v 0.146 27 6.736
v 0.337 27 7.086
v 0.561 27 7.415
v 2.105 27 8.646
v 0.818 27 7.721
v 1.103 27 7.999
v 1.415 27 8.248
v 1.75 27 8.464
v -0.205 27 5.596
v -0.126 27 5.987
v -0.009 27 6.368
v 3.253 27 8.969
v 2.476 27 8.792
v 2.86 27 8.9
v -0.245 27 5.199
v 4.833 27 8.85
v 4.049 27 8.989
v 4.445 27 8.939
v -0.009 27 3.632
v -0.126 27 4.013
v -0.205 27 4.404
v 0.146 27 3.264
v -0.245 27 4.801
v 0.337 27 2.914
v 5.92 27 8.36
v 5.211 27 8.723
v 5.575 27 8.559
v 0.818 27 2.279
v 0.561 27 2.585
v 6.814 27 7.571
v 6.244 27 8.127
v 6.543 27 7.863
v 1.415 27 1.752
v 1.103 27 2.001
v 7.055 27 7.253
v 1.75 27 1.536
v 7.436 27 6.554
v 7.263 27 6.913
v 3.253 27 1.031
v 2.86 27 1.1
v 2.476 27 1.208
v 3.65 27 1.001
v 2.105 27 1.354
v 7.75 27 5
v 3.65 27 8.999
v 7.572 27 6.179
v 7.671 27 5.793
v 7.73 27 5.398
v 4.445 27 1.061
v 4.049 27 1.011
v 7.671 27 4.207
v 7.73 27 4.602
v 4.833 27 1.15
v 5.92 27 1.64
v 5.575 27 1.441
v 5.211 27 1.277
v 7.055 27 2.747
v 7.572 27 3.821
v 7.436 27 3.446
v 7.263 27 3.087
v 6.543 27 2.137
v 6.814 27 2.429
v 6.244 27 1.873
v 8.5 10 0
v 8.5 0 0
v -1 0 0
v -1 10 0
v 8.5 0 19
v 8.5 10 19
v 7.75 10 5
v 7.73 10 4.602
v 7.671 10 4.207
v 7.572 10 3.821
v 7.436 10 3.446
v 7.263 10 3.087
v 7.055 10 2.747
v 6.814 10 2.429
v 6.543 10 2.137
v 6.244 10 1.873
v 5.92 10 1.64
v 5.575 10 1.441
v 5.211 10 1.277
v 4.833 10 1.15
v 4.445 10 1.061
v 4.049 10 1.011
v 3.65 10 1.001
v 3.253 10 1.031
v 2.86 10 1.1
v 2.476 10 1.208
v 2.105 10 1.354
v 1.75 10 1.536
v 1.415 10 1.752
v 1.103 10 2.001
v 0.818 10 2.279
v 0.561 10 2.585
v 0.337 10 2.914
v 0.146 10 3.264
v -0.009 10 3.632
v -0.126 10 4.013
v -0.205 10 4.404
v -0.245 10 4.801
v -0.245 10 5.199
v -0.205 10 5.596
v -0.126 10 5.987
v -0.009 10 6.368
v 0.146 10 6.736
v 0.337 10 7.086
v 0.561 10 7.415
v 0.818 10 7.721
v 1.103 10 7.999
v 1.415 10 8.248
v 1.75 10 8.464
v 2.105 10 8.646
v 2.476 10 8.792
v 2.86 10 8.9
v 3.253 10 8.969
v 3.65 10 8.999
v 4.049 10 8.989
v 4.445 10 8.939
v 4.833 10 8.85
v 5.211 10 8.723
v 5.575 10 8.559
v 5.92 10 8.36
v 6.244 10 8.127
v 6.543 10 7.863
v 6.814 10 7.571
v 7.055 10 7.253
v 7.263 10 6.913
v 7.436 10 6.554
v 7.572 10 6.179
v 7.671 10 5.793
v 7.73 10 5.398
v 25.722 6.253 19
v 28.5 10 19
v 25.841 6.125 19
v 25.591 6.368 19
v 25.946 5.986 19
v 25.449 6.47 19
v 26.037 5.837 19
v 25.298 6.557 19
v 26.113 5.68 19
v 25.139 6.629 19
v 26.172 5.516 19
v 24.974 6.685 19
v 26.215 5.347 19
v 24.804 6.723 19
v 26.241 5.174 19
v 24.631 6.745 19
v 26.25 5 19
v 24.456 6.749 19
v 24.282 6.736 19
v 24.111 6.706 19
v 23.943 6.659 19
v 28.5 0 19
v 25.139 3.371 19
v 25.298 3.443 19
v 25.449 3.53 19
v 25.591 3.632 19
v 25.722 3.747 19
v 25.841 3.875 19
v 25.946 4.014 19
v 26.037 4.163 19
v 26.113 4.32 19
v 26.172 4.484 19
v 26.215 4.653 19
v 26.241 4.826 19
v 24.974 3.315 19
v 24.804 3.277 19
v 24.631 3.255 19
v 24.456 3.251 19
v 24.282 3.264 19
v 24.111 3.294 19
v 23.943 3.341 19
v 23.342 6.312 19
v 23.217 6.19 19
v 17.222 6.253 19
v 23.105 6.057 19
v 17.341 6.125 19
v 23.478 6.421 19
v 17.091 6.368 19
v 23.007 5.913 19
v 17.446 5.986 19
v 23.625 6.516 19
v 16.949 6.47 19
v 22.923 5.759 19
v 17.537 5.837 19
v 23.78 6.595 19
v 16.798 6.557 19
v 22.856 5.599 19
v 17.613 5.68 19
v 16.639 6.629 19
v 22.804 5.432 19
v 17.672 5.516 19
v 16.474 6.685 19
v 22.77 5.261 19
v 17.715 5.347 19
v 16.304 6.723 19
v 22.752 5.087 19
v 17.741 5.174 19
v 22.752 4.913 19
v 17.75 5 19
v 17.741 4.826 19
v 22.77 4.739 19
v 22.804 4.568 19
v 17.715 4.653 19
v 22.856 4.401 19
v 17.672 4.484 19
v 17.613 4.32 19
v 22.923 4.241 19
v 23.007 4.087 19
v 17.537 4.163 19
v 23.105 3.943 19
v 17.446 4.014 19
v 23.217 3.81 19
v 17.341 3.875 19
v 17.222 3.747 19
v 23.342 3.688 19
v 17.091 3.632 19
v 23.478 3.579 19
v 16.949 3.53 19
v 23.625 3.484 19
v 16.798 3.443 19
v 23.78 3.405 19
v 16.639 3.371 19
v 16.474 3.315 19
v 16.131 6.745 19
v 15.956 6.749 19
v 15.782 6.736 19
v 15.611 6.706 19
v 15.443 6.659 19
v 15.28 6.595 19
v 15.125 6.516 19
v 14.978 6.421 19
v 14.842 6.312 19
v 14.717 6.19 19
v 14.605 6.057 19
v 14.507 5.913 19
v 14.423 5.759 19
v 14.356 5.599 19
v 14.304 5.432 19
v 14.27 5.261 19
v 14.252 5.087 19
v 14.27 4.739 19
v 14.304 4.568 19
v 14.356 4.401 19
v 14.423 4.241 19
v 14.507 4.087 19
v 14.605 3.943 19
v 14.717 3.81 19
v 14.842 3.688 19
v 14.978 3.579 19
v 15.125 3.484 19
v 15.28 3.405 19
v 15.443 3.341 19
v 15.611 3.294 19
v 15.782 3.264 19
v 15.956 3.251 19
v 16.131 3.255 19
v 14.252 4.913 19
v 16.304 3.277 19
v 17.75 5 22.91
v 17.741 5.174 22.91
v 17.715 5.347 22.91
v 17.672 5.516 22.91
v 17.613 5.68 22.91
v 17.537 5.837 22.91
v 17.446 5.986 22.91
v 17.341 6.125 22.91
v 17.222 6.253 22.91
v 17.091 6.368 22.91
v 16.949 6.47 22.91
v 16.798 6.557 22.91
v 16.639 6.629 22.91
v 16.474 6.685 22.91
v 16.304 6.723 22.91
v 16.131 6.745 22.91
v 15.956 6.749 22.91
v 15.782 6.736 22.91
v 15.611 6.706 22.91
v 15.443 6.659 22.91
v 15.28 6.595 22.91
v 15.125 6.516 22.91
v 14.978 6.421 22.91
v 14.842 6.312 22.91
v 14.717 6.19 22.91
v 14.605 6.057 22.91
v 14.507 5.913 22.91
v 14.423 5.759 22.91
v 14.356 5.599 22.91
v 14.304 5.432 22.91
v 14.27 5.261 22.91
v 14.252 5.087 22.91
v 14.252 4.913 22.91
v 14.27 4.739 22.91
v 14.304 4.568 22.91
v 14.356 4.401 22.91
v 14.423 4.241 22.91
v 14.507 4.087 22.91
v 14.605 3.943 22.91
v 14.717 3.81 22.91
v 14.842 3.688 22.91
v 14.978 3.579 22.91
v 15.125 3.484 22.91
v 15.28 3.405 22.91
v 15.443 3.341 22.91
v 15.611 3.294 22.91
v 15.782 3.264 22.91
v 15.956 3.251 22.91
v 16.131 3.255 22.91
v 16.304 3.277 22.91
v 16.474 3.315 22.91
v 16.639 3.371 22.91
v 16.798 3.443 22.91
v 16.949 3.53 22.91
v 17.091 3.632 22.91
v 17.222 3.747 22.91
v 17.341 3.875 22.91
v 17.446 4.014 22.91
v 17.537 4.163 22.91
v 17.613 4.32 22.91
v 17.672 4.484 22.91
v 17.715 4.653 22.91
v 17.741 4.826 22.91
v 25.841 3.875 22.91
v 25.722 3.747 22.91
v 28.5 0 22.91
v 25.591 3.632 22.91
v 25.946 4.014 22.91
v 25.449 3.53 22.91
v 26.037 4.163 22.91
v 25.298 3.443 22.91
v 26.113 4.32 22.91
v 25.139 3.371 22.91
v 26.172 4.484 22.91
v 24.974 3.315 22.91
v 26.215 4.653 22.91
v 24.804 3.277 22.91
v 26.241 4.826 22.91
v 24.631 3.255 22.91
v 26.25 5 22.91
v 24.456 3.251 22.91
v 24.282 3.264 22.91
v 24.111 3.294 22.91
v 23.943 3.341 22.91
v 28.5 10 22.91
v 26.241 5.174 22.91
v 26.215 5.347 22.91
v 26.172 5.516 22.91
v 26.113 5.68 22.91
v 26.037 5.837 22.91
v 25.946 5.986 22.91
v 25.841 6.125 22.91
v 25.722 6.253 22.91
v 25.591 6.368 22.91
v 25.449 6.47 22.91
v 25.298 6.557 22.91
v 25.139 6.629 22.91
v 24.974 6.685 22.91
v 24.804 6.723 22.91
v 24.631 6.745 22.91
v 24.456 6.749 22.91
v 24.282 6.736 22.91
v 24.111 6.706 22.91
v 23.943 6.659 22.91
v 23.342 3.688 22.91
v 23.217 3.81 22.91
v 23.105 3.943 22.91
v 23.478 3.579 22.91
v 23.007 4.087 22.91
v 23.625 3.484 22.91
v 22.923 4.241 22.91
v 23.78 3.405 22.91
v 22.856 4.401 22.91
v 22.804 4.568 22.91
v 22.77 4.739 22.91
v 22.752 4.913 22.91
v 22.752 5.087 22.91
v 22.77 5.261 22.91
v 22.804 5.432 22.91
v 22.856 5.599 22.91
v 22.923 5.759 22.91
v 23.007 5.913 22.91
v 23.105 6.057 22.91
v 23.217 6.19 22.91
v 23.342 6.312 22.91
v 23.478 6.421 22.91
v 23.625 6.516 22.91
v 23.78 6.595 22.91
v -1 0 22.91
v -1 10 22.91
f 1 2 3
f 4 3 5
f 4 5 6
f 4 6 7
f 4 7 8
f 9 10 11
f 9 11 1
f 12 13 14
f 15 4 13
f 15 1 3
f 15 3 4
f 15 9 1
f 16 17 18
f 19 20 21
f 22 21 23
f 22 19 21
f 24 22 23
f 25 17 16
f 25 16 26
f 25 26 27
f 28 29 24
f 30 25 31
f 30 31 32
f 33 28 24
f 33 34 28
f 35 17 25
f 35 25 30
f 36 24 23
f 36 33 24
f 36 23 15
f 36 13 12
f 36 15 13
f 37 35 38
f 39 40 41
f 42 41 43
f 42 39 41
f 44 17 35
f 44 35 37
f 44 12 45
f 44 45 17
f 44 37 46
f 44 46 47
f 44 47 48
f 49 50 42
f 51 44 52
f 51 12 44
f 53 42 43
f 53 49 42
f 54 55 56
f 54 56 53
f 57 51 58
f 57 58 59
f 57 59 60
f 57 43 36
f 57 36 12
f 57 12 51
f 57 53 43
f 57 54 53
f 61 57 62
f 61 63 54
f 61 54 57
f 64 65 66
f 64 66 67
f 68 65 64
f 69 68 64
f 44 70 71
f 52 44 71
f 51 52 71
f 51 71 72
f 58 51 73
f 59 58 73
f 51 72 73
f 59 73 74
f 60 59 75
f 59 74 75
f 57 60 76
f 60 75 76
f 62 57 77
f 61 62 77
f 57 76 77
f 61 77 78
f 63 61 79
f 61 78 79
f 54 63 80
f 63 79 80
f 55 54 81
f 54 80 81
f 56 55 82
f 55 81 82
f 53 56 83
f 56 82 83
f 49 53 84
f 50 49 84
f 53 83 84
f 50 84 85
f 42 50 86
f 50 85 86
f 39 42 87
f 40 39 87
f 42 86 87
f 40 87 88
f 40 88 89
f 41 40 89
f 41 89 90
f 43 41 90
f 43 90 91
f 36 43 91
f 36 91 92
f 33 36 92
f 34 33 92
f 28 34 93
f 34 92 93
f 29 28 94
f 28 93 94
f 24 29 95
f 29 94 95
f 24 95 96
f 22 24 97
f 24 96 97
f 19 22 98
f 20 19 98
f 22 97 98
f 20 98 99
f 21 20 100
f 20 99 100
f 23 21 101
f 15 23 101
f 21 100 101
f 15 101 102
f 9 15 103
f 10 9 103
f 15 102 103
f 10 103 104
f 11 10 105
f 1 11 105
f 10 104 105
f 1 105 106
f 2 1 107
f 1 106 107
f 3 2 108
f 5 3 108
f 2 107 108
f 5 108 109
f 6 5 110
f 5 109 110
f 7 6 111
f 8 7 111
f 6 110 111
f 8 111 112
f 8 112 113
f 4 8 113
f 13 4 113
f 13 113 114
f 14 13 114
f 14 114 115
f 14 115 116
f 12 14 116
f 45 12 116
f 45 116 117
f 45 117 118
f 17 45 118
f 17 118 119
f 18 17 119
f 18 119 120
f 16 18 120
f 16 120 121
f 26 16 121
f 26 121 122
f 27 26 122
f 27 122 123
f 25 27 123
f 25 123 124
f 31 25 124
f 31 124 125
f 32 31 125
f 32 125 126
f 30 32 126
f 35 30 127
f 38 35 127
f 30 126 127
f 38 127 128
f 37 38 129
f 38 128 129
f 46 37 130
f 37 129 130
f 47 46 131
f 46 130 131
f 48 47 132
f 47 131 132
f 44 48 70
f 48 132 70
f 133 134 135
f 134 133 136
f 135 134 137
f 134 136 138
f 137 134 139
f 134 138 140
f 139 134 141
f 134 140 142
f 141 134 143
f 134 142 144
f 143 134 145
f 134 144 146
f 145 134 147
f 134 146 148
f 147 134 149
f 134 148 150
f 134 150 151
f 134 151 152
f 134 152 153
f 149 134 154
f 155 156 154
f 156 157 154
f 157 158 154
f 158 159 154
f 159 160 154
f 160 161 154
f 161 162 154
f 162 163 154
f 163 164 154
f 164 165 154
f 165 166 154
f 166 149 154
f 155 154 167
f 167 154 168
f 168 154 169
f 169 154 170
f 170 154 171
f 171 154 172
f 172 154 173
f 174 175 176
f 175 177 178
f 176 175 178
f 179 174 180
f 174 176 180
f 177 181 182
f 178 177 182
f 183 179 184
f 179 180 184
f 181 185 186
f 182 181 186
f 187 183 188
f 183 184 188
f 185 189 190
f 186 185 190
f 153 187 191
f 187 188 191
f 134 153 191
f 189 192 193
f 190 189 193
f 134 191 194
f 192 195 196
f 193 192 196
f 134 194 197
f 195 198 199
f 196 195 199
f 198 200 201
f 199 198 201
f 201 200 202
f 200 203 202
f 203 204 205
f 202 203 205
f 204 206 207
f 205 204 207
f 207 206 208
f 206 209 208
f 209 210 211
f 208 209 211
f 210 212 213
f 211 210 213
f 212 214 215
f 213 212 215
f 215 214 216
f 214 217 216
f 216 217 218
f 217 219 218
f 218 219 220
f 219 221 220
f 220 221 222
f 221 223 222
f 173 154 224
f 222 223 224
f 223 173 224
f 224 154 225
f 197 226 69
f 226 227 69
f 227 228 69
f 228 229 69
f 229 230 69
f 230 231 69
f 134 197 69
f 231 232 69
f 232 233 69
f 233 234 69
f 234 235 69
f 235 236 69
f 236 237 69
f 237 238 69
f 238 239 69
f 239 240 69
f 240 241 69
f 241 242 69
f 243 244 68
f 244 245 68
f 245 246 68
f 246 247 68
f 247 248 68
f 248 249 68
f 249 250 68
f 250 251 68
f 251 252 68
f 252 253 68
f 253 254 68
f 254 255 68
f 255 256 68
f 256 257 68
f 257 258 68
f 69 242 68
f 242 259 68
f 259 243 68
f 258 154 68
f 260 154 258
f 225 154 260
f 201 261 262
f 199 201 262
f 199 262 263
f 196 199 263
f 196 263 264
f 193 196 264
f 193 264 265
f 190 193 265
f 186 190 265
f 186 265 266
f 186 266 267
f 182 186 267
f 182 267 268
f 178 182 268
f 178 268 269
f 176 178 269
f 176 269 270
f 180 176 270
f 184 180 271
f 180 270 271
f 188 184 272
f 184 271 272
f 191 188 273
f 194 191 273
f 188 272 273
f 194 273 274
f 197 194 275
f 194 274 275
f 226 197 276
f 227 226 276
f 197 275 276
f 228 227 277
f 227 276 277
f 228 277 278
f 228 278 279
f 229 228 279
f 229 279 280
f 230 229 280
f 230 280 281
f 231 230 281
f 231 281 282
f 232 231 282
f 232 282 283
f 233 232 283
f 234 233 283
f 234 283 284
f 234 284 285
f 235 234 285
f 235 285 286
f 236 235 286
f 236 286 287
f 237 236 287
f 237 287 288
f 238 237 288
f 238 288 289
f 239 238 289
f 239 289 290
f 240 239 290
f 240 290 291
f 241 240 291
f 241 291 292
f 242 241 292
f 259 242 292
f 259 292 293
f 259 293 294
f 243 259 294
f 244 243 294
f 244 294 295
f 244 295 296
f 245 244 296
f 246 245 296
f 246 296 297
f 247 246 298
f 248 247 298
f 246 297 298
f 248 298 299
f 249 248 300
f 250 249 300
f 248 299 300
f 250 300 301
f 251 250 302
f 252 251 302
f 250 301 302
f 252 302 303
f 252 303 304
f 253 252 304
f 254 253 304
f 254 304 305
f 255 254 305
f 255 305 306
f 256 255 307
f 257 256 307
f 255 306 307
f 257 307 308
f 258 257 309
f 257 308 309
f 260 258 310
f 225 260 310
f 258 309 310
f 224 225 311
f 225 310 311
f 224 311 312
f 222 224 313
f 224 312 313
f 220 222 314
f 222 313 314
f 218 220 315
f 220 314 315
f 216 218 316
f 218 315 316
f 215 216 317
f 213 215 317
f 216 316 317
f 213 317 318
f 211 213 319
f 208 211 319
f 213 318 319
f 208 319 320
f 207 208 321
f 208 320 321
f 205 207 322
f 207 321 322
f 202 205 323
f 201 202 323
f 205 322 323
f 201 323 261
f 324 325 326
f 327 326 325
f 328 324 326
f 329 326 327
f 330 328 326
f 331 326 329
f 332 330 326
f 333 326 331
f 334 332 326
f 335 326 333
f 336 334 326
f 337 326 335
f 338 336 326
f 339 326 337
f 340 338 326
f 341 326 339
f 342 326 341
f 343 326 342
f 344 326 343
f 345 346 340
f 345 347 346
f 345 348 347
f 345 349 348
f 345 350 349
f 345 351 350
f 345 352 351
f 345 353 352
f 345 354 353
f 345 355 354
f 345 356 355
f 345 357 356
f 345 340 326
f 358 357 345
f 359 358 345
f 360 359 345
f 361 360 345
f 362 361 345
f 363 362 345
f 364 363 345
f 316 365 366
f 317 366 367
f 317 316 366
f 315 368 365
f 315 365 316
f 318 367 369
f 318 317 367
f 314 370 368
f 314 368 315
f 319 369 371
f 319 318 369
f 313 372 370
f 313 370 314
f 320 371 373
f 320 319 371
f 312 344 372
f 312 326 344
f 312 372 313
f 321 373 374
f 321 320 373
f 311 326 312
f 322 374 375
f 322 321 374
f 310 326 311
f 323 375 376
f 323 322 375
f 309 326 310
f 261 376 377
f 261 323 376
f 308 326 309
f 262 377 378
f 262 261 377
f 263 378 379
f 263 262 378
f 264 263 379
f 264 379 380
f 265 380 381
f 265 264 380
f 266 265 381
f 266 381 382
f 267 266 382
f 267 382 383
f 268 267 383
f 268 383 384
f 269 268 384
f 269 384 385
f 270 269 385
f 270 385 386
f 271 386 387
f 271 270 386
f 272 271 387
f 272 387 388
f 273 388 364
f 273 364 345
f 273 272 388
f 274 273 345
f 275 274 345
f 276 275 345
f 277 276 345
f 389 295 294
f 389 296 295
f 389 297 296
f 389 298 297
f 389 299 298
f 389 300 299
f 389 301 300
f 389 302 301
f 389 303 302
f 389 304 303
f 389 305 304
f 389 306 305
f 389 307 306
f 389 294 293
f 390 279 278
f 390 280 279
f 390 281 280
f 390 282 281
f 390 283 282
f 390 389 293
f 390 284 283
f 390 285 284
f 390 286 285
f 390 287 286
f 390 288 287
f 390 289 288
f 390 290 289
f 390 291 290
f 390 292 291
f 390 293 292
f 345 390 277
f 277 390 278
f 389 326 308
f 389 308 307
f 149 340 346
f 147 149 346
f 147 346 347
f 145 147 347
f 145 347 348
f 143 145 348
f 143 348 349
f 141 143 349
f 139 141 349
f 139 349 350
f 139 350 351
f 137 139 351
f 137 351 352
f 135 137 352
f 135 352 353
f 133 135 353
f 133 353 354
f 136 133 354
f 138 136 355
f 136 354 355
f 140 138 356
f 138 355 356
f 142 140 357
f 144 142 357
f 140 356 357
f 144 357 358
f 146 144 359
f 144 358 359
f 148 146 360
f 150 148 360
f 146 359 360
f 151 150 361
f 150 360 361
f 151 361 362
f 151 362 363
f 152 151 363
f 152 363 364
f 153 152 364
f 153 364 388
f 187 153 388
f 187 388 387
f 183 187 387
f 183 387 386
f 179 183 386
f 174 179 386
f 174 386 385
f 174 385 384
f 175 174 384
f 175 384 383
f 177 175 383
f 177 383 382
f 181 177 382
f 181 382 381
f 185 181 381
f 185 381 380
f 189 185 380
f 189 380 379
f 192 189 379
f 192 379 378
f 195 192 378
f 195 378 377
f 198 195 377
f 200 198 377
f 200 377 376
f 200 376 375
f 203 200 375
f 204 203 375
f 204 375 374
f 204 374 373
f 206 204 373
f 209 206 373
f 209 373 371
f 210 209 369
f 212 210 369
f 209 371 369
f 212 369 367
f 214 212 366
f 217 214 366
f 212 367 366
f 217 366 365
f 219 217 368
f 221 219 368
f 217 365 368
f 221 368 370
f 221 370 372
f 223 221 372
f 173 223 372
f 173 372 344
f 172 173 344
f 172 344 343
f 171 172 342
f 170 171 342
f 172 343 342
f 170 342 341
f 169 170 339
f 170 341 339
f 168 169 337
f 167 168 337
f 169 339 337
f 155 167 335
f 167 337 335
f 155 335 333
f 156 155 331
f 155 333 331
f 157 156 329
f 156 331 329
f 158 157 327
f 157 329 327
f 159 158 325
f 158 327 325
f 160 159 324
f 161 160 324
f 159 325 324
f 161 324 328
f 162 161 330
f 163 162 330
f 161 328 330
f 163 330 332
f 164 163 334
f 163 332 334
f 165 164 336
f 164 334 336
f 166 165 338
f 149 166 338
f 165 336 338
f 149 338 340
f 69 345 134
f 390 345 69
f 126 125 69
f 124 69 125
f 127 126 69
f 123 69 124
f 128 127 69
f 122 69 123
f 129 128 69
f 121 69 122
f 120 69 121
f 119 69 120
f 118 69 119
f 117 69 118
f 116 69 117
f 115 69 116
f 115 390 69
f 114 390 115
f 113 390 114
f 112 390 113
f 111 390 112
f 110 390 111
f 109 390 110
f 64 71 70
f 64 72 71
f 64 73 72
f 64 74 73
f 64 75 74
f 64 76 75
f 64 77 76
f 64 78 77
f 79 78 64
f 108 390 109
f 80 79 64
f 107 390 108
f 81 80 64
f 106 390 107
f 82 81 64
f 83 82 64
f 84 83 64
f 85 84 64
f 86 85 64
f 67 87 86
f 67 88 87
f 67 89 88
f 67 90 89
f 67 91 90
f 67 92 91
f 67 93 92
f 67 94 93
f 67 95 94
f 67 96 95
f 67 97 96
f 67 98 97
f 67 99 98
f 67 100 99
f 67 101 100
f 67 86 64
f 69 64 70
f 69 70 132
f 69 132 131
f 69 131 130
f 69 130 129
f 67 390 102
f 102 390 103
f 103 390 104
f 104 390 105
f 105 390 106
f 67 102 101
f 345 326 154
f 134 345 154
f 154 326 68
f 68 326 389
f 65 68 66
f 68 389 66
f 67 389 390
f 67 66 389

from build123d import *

# Parameters (mm, degrees)
SKETCH1_W           = 12.5
SKETCH1_H           = 10
BOSS_EXTRUDE1_DEPTH = 10
SKETCH2_W           = 10
SKETCH2_H           = 10
BOSS_EXTRUDE2_DEPTH = 5
SKETCH3_R           = 4
BOSS_EXTRUDE3_DEPTH = 17
SKETCH4_W           = 4
SKETCH4_H           = 10
CUT_EXTRUDE1_DEPTH  = 11
SKETCH5_W           = 9.5
SKETCH5_H           = 10
BOSS_EXTRUDE4_DEPTH = 12.5
SKETCH6_W           = 5
SKETCH6_H           = 10
BOSS_EXTRUDE5_DEPTH = 30
SKETCH7_R           = 1.75
CUT_EXTRUDE2_DEPTH  = 23.5
SKETCH8_W           = 30
SKETCH8_H           = 5
CUT_EXTRUDE4_DEPTH  = 10
SKETCH10_W          = 9.5
SKETCH10_H          = 10
CUT_EXTRUDE6_DEPTH  = 3.49
SKETCH11_W          = 9.5
SKETCH11_H          = 10
BOSS_EXTRUDE6_DEPTH = 3.9
SKETCH12_W          = 4
SKETCH12_H          = 10
BOSS_EXTRUDE7_DEPTH = 20
SKETCH13_W          = 20
SKETCH13_H          = 0.09
CUT_EXTRUDE7_DEPTH  = 28
SKETCH14_R          = 1.75
CUT_EXTRUDE8_DEPTH  = 23.91


with BuildPart() as part:
    # Sketch1 → Boss-Extrude1 (new body)
    with BuildSketch(Plane.XY):
        with Locations((6.25, 5)):
            Rectangle(SKETCH1_W, SKETCH1_H)
    extrude(amount=BOSS_EXTRUDE1_DEPTH)

    # Sketch2 → Boss-Extrude2 (add)
    with BuildSketch(Plane.ZY):
        with Locations((5, 5)):
            Rectangle(SKETCH2_W, SKETCH2_H)
    extrude(amount=BOSS_EXTRUDE2_DEPTH)

    # Sketch3 → Boss-Extrude3 (add)
    with BuildSketch(Plane(origin=(0, 10, 0), x_dir=(1, 0, 0), z_dir=(0, 1, 0))):
        with Locations((3.75, -5)):
            Circle(SKETCH3_R)
    extrude(amount=BOSS_EXTRUDE3_DEPTH)

    # Sketch4 → Cut-Extrude1 (cut, through all)
    with BuildSketch(Plane(origin=(0, 10, 0), x_dir=(1, 0, 0), z_dir=(0, 1, 0))):
        with Locations((10.5, -5)):
            Rectangle(SKETCH4_W, SKETCH4_H)
        with Locations((-3, -5)):
            Rectangle(SKETCH4_W, SKETCH4_H)
    extrude(amount=-CUT_EXTRUDE1_DEPTH, mode=Mode.SUBTRACT)

    # Sketch5 → Boss-Extrude4 (add)
    with BuildSketch(Plane.XY.offset(10)):
        with Locations((3.75, 5)):
            Rectangle(SKETCH5_W, SKETCH5_H)
    extrude(amount=BOSS_EXTRUDE4_DEPTH)

    # Sketch6 → Boss-Extrude5 (add)
    with BuildSketch(Plane(origin=(8.5, 0, 0), x_dir=(0, 0, -1), z_dir=(1, 0, 0))):
        with Locations((-20, 5)):
            Rectangle(SKETCH6_W, SKETCH6_H)
    extrude(amount=BOSS_EXTRUDE5_DEPTH)

    # Sketch7 → Cut-Extrude2 (cut, through all)
    with BuildSketch(Plane.XY.offset(22.5)):
        with Locations((22.5, 5)):
            Circle(SKETCH7_R)
        with Locations((33.5, 5)):
            Circle(SKETCH7_R)
    extrude(amount=-CUT_EXTRUDE2_DEPTH, mode=Mode.SUBTRACT)

    # Sketch8 → Cut-Extrude4 (cut)
    with BuildSketch(Plane(origin=(0, 10, 0), x_dir=(1, 0, 0), z_dir=(0, 1, 0))):
        with Locations((23.5, -20)):
            Rectangle(SKETCH8_W, SKETCH8_H)
    extrude(amount=-CUT_EXTRUDE4_DEPTH, mode=Mode.SUBTRACT)

    # Sketch10 → Cut-Extrude6 (cut)
    with BuildSketch(Plane.XY.offset(22.5)):
        with Locations((3.75, 5)):
            Rectangle(SKETCH10_W, SKETCH10_H)
    extrude(amount=-CUT_EXTRUDE6_DEPTH, mode=Mode.SUBTRACT)

    # Sketch11 → Boss-Extrude6 (add)
    with BuildSketch(Plane.XY.offset(19.01)):
        with Locations((3.75, 5)):
            Rectangle(SKETCH11_W, SKETCH11_H)
    extrude(amount=BOSS_EXTRUDE6_DEPTH)

    # Sketch12 → Boss-Extrude7 (add)
    with BuildSketch(Plane(origin=(8.5, 0, 0), x_dir=(0, 0, -1), z_dir=(1, 0, 0))):
        with Locations((-20.91, 5)):
            Rectangle(SKETCH12_W, SKETCH12_H)
    extrude(amount=BOSS_EXTRUDE7_DEPTH)

    # Sketch13 → Cut-Extrude7 (cut, through all)
    with BuildSketch(Plane(origin=(0, 0, 0), x_dir=(-1, 0, 0), z_dir=(0, -1, 0))):
        with Locations((-18.5, -18.955)):
            Rectangle(SKETCH13_W, SKETCH13_H)
    extrude(amount=-CUT_EXTRUDE7_DEPTH, mode=Mode.SUBTRACT)

    # Sketch14 → Cut-Extrude8 (cut, through all)
    with BuildSketch(Plane.XY.offset(22.91)):
        with Locations((16, 5)):
            Circle(SKETCH14_R)
        with Locations((24.5, 5)):
            Circle(SKETCH14_R)
    extrude(amount=-CUT_EXTRUDE8_DEPTH, mode=Mode.SUBTRACT)


solid = part.part
